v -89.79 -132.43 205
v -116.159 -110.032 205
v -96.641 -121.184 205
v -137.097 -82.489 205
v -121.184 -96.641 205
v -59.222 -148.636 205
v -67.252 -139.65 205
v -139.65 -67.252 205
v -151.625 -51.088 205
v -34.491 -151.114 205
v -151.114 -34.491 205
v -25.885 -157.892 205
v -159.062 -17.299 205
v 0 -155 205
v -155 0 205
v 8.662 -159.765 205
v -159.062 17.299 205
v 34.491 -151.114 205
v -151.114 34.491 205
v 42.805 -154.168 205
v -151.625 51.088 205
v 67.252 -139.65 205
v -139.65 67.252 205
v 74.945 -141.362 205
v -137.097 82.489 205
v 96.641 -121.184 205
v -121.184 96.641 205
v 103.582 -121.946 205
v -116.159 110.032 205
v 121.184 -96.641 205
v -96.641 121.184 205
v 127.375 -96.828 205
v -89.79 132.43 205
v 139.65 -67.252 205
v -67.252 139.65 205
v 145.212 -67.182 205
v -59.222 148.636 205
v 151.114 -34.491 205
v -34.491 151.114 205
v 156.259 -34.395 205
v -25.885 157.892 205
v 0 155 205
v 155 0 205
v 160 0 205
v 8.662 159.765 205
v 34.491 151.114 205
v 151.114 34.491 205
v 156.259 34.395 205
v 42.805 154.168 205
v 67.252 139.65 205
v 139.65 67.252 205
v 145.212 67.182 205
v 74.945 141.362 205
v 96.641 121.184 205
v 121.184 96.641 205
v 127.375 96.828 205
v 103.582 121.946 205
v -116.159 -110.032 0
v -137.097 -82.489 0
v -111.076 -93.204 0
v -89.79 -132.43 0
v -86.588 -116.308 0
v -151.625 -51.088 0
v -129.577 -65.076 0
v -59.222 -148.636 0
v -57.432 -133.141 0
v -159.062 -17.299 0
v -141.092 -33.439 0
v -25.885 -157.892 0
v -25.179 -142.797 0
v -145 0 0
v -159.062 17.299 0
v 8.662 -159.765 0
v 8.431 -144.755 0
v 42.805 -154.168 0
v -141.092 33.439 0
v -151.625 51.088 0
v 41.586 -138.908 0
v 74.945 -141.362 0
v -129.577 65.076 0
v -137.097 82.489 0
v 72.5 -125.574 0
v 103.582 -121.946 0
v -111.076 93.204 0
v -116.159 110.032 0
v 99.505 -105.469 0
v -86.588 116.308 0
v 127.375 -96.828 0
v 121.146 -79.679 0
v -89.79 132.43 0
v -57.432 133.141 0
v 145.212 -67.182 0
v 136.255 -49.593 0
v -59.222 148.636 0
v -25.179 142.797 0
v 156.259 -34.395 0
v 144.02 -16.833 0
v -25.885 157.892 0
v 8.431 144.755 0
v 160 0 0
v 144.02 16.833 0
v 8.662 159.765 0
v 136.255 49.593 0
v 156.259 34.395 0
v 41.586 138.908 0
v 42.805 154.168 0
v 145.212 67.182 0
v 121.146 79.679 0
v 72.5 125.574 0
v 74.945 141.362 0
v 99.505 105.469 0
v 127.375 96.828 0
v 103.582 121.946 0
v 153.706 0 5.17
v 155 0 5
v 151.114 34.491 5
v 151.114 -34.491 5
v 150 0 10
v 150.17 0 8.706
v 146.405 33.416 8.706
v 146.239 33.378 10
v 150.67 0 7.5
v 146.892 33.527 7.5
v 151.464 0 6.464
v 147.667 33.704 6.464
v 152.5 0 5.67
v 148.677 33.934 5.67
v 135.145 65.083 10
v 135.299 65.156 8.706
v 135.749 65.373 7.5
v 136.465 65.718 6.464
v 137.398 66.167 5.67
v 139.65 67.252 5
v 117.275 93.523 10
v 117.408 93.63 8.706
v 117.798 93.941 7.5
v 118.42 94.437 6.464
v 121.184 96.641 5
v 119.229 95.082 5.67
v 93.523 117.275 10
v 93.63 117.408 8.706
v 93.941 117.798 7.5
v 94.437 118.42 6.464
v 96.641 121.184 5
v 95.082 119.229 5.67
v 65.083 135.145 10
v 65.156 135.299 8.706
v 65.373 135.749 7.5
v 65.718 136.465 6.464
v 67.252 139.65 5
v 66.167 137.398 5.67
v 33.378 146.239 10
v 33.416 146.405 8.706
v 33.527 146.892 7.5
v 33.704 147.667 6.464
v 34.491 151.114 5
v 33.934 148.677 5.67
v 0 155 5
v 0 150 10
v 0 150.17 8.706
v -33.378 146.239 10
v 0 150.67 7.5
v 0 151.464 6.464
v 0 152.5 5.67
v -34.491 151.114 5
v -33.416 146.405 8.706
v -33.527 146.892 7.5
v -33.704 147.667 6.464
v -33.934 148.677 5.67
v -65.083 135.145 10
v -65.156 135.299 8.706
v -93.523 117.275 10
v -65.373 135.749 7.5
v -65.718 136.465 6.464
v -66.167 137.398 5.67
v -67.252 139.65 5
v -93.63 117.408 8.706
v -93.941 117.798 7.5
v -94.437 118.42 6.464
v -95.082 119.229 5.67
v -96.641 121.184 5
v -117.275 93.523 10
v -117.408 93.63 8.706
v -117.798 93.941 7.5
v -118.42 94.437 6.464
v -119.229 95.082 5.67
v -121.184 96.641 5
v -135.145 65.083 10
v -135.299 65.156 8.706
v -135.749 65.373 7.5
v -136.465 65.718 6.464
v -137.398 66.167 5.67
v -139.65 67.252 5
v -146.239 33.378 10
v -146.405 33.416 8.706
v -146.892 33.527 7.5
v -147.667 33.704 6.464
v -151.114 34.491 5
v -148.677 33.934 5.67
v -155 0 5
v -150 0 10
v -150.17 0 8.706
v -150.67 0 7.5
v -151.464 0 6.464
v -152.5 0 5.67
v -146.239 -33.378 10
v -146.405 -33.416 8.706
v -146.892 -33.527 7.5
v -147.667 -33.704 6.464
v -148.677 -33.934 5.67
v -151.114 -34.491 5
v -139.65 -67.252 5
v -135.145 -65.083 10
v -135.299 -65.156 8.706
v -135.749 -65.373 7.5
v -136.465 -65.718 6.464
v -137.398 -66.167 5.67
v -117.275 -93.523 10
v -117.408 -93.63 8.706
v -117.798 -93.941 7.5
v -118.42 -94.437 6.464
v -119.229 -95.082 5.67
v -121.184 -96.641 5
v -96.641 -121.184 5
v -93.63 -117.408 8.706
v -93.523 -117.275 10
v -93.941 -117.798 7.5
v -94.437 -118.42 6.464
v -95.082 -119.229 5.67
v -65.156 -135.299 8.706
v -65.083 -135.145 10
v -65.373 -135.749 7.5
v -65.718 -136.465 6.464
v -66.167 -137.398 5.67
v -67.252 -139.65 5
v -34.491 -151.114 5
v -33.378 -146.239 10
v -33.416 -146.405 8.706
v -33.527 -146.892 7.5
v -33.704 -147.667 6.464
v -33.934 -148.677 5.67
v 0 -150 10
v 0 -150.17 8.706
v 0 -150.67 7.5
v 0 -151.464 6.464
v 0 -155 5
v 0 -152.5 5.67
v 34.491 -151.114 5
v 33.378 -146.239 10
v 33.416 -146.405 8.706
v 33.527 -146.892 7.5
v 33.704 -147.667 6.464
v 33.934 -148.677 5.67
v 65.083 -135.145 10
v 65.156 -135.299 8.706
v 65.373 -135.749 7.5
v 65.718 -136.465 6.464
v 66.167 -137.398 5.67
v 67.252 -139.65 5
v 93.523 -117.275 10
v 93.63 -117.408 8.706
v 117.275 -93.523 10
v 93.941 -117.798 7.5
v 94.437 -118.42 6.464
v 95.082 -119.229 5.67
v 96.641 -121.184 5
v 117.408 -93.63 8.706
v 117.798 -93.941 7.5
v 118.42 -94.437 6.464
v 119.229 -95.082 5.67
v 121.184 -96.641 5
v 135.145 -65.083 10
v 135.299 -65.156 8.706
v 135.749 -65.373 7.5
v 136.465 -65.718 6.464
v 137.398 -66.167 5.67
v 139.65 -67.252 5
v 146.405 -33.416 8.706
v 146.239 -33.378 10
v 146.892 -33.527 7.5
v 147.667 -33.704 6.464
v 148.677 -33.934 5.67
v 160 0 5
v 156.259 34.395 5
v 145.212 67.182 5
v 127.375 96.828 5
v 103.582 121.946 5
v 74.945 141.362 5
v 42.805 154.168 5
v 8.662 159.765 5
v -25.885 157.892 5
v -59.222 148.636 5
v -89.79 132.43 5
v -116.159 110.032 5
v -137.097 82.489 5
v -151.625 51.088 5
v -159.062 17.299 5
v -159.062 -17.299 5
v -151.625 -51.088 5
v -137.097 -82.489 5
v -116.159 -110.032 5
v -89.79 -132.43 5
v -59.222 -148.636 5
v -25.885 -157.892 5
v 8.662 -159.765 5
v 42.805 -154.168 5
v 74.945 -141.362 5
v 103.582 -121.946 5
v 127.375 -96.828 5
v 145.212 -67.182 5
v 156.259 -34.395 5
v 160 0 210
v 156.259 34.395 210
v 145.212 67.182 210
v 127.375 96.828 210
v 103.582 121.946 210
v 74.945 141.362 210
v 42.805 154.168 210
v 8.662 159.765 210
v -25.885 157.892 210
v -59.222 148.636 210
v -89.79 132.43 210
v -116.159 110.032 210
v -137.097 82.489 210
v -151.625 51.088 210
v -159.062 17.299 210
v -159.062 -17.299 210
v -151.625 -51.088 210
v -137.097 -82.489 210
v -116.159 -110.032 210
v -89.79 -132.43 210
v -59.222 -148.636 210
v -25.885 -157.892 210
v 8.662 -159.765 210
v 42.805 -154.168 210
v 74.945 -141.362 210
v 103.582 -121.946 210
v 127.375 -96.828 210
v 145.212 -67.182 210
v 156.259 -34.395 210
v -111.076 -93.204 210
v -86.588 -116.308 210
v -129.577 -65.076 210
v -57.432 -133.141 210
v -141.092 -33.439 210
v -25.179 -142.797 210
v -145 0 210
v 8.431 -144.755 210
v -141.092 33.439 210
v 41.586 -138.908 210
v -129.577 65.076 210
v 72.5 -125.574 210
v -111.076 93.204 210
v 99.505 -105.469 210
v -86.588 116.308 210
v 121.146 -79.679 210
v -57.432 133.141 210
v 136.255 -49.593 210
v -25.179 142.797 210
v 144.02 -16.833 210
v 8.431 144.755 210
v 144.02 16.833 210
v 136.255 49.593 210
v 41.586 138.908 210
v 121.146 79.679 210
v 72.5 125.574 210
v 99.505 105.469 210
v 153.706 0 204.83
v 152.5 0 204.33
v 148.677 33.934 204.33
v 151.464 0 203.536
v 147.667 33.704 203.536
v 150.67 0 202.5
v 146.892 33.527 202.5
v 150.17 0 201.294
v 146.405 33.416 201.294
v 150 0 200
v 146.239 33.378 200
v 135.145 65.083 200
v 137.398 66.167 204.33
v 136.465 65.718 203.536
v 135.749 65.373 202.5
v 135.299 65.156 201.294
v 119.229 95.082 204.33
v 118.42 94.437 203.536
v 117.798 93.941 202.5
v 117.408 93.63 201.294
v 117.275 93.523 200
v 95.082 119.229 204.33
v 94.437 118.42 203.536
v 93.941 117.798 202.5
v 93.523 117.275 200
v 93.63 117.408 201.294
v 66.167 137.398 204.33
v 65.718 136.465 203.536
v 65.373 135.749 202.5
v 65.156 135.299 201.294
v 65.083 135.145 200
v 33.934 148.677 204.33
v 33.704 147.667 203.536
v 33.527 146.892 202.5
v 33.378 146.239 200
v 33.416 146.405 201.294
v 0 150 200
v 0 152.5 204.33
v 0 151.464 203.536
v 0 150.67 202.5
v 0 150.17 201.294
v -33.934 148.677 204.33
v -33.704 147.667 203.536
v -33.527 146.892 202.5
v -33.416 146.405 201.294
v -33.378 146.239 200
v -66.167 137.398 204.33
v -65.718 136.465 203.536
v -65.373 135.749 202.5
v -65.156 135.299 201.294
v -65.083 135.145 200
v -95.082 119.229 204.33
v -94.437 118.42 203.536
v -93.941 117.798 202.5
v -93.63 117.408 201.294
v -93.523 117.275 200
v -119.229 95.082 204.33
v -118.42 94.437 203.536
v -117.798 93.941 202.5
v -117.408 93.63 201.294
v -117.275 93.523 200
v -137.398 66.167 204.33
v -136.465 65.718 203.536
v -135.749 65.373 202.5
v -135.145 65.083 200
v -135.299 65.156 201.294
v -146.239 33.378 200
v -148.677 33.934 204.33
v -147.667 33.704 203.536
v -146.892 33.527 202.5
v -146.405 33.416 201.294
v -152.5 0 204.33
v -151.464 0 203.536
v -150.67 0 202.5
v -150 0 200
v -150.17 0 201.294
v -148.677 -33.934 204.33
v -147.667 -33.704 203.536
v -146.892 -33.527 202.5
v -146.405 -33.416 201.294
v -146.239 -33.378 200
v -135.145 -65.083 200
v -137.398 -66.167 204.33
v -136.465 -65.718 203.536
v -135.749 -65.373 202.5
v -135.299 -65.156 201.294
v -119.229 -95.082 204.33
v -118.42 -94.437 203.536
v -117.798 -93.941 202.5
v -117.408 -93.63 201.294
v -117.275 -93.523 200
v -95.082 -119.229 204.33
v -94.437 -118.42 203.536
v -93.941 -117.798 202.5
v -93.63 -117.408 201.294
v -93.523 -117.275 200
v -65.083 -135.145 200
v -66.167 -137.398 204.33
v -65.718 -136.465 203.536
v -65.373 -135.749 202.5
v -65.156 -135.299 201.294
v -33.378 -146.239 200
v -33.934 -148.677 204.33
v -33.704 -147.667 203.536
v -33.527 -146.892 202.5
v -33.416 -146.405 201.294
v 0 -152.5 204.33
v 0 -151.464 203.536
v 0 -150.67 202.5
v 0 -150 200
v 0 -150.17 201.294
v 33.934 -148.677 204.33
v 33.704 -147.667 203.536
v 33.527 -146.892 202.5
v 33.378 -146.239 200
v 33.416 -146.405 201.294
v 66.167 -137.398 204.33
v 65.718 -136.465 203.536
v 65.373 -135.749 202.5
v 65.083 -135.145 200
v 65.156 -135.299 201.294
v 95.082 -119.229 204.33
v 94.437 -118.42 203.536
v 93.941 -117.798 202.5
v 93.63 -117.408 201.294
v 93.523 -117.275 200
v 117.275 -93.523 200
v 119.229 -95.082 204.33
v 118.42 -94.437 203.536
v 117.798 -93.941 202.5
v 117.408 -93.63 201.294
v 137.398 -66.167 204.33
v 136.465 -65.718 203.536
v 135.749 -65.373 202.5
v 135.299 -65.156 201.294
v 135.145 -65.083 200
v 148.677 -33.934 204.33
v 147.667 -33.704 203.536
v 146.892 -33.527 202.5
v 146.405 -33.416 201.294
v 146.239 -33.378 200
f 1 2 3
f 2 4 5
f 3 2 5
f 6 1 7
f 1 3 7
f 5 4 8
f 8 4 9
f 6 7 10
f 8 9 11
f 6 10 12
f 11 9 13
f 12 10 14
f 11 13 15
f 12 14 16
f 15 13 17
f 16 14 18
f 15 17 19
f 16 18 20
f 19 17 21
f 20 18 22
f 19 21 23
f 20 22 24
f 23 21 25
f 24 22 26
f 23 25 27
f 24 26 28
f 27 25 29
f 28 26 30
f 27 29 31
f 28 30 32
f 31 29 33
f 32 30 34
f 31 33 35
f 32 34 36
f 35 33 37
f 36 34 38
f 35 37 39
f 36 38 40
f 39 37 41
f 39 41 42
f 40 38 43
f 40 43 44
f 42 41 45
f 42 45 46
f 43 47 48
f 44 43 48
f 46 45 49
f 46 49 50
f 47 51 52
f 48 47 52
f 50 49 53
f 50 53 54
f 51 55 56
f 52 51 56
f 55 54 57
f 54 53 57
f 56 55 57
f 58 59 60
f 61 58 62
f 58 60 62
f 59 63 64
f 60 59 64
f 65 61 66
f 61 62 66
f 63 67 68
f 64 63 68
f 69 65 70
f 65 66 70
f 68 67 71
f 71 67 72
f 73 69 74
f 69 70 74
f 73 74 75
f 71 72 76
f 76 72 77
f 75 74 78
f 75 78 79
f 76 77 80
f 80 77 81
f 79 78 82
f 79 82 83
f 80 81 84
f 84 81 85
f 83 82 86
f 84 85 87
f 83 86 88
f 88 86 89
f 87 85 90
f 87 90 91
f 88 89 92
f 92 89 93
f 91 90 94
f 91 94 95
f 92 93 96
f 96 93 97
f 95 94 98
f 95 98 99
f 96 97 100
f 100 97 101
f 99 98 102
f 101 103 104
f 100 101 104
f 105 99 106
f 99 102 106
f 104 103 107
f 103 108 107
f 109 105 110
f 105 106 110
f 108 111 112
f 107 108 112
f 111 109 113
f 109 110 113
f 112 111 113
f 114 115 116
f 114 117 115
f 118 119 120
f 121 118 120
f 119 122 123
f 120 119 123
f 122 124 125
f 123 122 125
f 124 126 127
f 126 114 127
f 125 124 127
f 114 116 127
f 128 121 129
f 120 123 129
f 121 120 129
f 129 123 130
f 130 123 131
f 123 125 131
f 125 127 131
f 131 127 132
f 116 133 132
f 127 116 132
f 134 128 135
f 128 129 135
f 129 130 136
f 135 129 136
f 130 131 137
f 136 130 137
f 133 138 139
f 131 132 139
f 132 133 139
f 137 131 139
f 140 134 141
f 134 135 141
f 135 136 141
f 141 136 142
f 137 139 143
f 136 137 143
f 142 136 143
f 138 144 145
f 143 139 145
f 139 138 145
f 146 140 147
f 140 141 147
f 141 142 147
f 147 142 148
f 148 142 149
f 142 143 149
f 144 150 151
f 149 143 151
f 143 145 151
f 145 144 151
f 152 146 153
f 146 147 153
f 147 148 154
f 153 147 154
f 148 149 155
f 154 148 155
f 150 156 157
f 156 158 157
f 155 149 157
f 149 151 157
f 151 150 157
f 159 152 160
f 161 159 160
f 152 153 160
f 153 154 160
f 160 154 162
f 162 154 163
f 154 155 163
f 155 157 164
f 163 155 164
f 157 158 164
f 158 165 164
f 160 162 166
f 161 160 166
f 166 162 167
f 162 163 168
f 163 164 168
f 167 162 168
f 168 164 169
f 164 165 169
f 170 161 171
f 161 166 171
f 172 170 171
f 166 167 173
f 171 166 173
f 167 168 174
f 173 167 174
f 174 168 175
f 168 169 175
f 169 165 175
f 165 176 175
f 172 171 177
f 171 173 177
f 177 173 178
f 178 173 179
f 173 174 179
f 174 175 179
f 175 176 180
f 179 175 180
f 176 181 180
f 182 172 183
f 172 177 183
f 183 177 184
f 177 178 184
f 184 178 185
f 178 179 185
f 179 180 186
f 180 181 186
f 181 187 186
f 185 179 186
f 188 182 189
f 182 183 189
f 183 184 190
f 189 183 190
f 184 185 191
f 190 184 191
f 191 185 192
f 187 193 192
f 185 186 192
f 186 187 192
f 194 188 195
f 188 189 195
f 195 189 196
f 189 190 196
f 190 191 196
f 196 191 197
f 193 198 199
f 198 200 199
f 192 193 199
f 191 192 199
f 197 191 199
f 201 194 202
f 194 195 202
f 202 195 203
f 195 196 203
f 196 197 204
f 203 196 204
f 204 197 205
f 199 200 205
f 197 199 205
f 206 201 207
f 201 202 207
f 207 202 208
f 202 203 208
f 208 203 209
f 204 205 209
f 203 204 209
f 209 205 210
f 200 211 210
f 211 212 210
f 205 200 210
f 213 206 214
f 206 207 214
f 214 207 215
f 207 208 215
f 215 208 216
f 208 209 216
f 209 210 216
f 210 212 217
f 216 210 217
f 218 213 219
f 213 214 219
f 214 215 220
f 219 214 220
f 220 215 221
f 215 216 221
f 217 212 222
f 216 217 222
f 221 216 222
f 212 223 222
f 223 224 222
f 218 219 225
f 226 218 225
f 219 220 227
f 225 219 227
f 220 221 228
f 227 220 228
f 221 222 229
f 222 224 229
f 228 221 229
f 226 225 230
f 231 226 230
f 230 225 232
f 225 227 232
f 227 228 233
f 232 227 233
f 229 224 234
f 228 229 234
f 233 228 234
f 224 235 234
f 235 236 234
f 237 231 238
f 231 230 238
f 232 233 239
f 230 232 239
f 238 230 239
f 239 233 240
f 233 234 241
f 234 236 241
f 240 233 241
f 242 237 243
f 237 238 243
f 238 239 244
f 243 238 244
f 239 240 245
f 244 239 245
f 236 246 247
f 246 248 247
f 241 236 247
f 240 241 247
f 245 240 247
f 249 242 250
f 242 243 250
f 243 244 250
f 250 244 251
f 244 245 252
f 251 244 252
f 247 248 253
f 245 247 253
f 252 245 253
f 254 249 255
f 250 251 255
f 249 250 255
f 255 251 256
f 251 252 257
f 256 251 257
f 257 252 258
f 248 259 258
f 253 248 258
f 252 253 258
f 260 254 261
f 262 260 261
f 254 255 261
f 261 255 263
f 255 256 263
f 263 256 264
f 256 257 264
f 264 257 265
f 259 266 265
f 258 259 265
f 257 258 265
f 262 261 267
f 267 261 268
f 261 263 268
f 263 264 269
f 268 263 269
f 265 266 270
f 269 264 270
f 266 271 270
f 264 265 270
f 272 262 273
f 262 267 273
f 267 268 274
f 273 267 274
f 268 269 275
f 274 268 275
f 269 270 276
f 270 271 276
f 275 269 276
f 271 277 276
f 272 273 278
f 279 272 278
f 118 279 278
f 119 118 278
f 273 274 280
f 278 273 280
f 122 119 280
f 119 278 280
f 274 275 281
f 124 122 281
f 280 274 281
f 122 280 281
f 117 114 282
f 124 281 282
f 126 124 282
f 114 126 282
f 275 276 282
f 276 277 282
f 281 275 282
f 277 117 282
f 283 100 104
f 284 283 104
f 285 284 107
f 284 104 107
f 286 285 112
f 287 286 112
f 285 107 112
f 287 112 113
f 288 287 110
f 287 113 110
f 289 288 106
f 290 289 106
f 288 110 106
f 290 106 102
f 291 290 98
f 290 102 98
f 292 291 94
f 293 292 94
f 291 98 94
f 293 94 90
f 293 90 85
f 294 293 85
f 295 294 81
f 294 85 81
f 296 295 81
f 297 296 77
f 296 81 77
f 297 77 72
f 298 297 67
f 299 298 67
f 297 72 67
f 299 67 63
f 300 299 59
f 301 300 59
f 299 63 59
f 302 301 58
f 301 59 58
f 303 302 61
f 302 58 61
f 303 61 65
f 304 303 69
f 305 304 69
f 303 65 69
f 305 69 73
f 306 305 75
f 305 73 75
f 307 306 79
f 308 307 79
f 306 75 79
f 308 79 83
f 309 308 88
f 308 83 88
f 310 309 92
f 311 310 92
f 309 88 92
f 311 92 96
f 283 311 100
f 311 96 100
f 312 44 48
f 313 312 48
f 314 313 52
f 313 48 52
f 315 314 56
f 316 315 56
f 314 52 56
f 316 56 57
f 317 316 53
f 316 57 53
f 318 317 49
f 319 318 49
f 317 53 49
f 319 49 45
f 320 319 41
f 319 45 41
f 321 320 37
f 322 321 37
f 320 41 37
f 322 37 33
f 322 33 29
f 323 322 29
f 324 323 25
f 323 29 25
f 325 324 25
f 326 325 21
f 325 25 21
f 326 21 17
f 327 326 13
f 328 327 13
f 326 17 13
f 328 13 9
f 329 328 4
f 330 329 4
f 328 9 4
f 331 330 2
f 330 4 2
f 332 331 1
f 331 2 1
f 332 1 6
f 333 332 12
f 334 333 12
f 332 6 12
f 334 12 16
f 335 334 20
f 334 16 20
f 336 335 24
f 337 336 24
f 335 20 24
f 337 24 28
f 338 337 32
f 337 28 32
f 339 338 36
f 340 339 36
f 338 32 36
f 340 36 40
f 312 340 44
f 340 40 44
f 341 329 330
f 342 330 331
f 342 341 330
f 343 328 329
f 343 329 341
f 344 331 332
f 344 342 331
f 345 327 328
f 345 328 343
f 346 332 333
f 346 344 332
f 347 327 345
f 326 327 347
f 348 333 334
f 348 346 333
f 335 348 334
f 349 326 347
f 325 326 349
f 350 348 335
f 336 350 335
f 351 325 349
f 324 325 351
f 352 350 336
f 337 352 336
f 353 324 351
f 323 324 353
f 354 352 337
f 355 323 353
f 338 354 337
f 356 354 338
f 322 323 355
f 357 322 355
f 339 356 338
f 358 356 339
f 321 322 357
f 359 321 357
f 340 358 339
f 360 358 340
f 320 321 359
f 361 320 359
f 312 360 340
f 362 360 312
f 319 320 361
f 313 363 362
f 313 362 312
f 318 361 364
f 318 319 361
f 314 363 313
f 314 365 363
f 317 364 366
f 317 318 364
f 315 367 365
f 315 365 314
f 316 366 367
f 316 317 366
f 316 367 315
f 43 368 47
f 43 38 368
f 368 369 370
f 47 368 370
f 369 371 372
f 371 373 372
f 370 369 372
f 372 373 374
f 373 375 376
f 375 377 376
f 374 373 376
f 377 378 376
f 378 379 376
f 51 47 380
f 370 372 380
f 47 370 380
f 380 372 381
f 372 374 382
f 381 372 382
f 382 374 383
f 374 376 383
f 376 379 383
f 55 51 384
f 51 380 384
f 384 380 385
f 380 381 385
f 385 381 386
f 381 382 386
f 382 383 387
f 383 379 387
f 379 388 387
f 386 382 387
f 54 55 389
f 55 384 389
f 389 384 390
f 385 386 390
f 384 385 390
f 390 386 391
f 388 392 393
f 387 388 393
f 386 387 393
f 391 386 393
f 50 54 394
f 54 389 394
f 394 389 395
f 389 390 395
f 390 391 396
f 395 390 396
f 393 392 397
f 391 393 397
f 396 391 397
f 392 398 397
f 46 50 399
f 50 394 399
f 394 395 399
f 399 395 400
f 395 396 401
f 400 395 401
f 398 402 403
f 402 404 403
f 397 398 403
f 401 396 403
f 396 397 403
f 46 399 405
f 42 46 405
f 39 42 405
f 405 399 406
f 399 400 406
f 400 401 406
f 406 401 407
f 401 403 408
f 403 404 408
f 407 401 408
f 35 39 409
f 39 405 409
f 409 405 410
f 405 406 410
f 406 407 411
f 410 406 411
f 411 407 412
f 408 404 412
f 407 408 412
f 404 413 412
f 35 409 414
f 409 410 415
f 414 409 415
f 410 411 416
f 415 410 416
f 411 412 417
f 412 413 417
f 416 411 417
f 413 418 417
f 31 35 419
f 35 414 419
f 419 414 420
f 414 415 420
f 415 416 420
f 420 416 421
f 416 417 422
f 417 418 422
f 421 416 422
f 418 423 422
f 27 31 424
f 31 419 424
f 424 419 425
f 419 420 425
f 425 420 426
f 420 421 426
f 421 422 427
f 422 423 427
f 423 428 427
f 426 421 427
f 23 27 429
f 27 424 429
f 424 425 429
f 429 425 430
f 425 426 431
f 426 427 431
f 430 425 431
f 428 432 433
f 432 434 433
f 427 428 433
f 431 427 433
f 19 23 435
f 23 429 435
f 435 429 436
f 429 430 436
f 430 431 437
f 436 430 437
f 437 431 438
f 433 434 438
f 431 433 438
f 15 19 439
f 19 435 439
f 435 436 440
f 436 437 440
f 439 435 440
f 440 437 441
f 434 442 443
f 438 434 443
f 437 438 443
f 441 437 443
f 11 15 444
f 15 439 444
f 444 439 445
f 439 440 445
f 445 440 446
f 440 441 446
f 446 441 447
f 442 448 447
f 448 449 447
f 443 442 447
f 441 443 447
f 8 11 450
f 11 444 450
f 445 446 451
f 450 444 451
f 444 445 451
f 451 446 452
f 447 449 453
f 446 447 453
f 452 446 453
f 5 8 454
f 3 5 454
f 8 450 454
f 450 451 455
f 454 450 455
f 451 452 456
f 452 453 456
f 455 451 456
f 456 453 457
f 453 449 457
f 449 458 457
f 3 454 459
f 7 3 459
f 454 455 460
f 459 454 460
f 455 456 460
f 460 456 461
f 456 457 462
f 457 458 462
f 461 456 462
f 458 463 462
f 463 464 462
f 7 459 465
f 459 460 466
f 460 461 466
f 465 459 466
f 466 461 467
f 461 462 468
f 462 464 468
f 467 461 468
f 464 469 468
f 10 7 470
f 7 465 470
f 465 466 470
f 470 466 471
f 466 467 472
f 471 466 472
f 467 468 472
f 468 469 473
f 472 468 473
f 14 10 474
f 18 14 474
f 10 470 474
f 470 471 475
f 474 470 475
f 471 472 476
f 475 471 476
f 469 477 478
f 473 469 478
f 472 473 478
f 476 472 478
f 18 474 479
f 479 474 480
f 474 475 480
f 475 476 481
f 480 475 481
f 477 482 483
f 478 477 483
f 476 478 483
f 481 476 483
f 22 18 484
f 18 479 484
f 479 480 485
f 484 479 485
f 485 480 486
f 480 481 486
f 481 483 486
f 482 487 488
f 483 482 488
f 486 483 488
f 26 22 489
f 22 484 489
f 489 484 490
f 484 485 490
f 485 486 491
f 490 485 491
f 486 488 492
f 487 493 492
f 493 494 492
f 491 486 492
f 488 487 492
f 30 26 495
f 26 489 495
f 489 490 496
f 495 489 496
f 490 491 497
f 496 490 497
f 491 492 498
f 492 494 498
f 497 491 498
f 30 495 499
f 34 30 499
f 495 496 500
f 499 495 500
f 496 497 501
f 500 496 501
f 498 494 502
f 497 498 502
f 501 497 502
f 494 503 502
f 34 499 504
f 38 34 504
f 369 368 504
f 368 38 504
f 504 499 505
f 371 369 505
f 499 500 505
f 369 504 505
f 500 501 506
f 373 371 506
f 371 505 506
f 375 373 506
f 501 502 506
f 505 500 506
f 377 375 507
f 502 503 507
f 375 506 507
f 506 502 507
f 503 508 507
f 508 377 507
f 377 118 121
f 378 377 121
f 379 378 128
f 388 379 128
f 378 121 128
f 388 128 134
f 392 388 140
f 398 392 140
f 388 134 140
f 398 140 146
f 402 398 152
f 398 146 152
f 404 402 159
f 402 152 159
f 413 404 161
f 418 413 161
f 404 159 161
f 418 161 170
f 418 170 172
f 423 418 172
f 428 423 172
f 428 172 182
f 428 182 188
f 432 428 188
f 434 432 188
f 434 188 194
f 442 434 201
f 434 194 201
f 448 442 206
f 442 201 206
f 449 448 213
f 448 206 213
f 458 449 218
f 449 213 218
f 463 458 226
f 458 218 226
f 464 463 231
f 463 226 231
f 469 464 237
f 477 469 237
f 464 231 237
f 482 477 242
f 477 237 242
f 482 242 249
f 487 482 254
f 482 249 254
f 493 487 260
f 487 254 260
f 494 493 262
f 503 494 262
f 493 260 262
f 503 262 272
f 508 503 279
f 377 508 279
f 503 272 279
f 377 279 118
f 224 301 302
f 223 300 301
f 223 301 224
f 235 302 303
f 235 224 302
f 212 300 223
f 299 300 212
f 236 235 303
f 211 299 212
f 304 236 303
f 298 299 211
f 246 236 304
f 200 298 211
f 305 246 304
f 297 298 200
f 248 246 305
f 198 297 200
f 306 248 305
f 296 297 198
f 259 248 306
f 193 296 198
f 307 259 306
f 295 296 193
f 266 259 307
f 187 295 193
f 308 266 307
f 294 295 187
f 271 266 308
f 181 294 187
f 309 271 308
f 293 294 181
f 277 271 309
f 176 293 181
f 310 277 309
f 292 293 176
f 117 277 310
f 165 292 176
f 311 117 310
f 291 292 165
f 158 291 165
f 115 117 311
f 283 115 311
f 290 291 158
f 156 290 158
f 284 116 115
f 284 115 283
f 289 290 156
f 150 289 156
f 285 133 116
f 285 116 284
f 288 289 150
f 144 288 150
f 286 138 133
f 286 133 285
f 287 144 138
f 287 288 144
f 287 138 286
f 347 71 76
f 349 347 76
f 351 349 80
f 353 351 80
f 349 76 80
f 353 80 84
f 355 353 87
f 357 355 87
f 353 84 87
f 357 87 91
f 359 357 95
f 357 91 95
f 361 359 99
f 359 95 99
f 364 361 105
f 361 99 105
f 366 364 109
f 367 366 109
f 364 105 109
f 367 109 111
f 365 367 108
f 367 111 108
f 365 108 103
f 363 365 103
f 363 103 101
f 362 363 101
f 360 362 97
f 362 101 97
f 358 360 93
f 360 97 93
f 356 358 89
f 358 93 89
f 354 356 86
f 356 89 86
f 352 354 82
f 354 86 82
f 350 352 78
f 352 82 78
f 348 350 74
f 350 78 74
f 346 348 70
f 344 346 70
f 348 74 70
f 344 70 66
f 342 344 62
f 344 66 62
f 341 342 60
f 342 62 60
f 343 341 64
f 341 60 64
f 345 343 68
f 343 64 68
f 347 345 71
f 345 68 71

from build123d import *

# Parameters (mm, degrees)
IZIM1_R                     = 160
Y_KSEKLIK_EKSTR_ZYON1_DEPTH = 5
IZIM2_R                     = 150
Y_KSEKLIK_EKSTR_ZYON2_DEPTH = 200
IZIM3_R                     = 160
Y_KSEKLIK_EKSTR_ZYON3_DEPTH = 5
IZIM4_R                     = 145
KES_EKSTR_ZYON1_DEPTH       = 210
RADYUS1_R                   = 5


with BuildPart() as part:
    # Çizim1 → Yükseklik-Ekstrüzyon1 (new body)
    with BuildSketch(Plane.XY):
        Circle(IZIM1_R)
    extrude(amount=Y_KSEKLIK_EKSTR_ZYON1_DEPTH)

    # Çizim2 → Yükseklik-Ekstrüzyon2 (add)
    with BuildSketch(Plane.XY.offset(5)):
        Circle(IZIM2_R)
    extrude(amount=Y_KSEKLIK_EKSTR_ZYON2_DEPTH)

    # Çizim3 → Yükseklik-Ekstrüzyon3 (add)
    with BuildSketch(Plane.XY.offset(205)):
        Circle(IZIM3_R)
    extrude(amount=Y_KSEKLIK_EKSTR_ZYON3_DEPTH)

    # Çizim4 → Kes-Ekstrüzyon1 (cut)
    with BuildSketch(Plane(origin=(0, 0, 0), x_dir=(-1, 0, 0), z_dir=(0, 0, -1))):
        Circle(IZIM4_R)
    extrude(amount=-KES_EKSTR_ZYON1_DEPTH, mode=Mode.SUBTRACT)

    # Radyus1
    radyus1_edges = [part.edges().sort_by_distance(p)[0] for p in [
        (-150, 0, 5),
        (-150, 0, 205),
    ]]
    fillet(radyus1_edges, radius=RADYUS1_R)


solid = part.part
